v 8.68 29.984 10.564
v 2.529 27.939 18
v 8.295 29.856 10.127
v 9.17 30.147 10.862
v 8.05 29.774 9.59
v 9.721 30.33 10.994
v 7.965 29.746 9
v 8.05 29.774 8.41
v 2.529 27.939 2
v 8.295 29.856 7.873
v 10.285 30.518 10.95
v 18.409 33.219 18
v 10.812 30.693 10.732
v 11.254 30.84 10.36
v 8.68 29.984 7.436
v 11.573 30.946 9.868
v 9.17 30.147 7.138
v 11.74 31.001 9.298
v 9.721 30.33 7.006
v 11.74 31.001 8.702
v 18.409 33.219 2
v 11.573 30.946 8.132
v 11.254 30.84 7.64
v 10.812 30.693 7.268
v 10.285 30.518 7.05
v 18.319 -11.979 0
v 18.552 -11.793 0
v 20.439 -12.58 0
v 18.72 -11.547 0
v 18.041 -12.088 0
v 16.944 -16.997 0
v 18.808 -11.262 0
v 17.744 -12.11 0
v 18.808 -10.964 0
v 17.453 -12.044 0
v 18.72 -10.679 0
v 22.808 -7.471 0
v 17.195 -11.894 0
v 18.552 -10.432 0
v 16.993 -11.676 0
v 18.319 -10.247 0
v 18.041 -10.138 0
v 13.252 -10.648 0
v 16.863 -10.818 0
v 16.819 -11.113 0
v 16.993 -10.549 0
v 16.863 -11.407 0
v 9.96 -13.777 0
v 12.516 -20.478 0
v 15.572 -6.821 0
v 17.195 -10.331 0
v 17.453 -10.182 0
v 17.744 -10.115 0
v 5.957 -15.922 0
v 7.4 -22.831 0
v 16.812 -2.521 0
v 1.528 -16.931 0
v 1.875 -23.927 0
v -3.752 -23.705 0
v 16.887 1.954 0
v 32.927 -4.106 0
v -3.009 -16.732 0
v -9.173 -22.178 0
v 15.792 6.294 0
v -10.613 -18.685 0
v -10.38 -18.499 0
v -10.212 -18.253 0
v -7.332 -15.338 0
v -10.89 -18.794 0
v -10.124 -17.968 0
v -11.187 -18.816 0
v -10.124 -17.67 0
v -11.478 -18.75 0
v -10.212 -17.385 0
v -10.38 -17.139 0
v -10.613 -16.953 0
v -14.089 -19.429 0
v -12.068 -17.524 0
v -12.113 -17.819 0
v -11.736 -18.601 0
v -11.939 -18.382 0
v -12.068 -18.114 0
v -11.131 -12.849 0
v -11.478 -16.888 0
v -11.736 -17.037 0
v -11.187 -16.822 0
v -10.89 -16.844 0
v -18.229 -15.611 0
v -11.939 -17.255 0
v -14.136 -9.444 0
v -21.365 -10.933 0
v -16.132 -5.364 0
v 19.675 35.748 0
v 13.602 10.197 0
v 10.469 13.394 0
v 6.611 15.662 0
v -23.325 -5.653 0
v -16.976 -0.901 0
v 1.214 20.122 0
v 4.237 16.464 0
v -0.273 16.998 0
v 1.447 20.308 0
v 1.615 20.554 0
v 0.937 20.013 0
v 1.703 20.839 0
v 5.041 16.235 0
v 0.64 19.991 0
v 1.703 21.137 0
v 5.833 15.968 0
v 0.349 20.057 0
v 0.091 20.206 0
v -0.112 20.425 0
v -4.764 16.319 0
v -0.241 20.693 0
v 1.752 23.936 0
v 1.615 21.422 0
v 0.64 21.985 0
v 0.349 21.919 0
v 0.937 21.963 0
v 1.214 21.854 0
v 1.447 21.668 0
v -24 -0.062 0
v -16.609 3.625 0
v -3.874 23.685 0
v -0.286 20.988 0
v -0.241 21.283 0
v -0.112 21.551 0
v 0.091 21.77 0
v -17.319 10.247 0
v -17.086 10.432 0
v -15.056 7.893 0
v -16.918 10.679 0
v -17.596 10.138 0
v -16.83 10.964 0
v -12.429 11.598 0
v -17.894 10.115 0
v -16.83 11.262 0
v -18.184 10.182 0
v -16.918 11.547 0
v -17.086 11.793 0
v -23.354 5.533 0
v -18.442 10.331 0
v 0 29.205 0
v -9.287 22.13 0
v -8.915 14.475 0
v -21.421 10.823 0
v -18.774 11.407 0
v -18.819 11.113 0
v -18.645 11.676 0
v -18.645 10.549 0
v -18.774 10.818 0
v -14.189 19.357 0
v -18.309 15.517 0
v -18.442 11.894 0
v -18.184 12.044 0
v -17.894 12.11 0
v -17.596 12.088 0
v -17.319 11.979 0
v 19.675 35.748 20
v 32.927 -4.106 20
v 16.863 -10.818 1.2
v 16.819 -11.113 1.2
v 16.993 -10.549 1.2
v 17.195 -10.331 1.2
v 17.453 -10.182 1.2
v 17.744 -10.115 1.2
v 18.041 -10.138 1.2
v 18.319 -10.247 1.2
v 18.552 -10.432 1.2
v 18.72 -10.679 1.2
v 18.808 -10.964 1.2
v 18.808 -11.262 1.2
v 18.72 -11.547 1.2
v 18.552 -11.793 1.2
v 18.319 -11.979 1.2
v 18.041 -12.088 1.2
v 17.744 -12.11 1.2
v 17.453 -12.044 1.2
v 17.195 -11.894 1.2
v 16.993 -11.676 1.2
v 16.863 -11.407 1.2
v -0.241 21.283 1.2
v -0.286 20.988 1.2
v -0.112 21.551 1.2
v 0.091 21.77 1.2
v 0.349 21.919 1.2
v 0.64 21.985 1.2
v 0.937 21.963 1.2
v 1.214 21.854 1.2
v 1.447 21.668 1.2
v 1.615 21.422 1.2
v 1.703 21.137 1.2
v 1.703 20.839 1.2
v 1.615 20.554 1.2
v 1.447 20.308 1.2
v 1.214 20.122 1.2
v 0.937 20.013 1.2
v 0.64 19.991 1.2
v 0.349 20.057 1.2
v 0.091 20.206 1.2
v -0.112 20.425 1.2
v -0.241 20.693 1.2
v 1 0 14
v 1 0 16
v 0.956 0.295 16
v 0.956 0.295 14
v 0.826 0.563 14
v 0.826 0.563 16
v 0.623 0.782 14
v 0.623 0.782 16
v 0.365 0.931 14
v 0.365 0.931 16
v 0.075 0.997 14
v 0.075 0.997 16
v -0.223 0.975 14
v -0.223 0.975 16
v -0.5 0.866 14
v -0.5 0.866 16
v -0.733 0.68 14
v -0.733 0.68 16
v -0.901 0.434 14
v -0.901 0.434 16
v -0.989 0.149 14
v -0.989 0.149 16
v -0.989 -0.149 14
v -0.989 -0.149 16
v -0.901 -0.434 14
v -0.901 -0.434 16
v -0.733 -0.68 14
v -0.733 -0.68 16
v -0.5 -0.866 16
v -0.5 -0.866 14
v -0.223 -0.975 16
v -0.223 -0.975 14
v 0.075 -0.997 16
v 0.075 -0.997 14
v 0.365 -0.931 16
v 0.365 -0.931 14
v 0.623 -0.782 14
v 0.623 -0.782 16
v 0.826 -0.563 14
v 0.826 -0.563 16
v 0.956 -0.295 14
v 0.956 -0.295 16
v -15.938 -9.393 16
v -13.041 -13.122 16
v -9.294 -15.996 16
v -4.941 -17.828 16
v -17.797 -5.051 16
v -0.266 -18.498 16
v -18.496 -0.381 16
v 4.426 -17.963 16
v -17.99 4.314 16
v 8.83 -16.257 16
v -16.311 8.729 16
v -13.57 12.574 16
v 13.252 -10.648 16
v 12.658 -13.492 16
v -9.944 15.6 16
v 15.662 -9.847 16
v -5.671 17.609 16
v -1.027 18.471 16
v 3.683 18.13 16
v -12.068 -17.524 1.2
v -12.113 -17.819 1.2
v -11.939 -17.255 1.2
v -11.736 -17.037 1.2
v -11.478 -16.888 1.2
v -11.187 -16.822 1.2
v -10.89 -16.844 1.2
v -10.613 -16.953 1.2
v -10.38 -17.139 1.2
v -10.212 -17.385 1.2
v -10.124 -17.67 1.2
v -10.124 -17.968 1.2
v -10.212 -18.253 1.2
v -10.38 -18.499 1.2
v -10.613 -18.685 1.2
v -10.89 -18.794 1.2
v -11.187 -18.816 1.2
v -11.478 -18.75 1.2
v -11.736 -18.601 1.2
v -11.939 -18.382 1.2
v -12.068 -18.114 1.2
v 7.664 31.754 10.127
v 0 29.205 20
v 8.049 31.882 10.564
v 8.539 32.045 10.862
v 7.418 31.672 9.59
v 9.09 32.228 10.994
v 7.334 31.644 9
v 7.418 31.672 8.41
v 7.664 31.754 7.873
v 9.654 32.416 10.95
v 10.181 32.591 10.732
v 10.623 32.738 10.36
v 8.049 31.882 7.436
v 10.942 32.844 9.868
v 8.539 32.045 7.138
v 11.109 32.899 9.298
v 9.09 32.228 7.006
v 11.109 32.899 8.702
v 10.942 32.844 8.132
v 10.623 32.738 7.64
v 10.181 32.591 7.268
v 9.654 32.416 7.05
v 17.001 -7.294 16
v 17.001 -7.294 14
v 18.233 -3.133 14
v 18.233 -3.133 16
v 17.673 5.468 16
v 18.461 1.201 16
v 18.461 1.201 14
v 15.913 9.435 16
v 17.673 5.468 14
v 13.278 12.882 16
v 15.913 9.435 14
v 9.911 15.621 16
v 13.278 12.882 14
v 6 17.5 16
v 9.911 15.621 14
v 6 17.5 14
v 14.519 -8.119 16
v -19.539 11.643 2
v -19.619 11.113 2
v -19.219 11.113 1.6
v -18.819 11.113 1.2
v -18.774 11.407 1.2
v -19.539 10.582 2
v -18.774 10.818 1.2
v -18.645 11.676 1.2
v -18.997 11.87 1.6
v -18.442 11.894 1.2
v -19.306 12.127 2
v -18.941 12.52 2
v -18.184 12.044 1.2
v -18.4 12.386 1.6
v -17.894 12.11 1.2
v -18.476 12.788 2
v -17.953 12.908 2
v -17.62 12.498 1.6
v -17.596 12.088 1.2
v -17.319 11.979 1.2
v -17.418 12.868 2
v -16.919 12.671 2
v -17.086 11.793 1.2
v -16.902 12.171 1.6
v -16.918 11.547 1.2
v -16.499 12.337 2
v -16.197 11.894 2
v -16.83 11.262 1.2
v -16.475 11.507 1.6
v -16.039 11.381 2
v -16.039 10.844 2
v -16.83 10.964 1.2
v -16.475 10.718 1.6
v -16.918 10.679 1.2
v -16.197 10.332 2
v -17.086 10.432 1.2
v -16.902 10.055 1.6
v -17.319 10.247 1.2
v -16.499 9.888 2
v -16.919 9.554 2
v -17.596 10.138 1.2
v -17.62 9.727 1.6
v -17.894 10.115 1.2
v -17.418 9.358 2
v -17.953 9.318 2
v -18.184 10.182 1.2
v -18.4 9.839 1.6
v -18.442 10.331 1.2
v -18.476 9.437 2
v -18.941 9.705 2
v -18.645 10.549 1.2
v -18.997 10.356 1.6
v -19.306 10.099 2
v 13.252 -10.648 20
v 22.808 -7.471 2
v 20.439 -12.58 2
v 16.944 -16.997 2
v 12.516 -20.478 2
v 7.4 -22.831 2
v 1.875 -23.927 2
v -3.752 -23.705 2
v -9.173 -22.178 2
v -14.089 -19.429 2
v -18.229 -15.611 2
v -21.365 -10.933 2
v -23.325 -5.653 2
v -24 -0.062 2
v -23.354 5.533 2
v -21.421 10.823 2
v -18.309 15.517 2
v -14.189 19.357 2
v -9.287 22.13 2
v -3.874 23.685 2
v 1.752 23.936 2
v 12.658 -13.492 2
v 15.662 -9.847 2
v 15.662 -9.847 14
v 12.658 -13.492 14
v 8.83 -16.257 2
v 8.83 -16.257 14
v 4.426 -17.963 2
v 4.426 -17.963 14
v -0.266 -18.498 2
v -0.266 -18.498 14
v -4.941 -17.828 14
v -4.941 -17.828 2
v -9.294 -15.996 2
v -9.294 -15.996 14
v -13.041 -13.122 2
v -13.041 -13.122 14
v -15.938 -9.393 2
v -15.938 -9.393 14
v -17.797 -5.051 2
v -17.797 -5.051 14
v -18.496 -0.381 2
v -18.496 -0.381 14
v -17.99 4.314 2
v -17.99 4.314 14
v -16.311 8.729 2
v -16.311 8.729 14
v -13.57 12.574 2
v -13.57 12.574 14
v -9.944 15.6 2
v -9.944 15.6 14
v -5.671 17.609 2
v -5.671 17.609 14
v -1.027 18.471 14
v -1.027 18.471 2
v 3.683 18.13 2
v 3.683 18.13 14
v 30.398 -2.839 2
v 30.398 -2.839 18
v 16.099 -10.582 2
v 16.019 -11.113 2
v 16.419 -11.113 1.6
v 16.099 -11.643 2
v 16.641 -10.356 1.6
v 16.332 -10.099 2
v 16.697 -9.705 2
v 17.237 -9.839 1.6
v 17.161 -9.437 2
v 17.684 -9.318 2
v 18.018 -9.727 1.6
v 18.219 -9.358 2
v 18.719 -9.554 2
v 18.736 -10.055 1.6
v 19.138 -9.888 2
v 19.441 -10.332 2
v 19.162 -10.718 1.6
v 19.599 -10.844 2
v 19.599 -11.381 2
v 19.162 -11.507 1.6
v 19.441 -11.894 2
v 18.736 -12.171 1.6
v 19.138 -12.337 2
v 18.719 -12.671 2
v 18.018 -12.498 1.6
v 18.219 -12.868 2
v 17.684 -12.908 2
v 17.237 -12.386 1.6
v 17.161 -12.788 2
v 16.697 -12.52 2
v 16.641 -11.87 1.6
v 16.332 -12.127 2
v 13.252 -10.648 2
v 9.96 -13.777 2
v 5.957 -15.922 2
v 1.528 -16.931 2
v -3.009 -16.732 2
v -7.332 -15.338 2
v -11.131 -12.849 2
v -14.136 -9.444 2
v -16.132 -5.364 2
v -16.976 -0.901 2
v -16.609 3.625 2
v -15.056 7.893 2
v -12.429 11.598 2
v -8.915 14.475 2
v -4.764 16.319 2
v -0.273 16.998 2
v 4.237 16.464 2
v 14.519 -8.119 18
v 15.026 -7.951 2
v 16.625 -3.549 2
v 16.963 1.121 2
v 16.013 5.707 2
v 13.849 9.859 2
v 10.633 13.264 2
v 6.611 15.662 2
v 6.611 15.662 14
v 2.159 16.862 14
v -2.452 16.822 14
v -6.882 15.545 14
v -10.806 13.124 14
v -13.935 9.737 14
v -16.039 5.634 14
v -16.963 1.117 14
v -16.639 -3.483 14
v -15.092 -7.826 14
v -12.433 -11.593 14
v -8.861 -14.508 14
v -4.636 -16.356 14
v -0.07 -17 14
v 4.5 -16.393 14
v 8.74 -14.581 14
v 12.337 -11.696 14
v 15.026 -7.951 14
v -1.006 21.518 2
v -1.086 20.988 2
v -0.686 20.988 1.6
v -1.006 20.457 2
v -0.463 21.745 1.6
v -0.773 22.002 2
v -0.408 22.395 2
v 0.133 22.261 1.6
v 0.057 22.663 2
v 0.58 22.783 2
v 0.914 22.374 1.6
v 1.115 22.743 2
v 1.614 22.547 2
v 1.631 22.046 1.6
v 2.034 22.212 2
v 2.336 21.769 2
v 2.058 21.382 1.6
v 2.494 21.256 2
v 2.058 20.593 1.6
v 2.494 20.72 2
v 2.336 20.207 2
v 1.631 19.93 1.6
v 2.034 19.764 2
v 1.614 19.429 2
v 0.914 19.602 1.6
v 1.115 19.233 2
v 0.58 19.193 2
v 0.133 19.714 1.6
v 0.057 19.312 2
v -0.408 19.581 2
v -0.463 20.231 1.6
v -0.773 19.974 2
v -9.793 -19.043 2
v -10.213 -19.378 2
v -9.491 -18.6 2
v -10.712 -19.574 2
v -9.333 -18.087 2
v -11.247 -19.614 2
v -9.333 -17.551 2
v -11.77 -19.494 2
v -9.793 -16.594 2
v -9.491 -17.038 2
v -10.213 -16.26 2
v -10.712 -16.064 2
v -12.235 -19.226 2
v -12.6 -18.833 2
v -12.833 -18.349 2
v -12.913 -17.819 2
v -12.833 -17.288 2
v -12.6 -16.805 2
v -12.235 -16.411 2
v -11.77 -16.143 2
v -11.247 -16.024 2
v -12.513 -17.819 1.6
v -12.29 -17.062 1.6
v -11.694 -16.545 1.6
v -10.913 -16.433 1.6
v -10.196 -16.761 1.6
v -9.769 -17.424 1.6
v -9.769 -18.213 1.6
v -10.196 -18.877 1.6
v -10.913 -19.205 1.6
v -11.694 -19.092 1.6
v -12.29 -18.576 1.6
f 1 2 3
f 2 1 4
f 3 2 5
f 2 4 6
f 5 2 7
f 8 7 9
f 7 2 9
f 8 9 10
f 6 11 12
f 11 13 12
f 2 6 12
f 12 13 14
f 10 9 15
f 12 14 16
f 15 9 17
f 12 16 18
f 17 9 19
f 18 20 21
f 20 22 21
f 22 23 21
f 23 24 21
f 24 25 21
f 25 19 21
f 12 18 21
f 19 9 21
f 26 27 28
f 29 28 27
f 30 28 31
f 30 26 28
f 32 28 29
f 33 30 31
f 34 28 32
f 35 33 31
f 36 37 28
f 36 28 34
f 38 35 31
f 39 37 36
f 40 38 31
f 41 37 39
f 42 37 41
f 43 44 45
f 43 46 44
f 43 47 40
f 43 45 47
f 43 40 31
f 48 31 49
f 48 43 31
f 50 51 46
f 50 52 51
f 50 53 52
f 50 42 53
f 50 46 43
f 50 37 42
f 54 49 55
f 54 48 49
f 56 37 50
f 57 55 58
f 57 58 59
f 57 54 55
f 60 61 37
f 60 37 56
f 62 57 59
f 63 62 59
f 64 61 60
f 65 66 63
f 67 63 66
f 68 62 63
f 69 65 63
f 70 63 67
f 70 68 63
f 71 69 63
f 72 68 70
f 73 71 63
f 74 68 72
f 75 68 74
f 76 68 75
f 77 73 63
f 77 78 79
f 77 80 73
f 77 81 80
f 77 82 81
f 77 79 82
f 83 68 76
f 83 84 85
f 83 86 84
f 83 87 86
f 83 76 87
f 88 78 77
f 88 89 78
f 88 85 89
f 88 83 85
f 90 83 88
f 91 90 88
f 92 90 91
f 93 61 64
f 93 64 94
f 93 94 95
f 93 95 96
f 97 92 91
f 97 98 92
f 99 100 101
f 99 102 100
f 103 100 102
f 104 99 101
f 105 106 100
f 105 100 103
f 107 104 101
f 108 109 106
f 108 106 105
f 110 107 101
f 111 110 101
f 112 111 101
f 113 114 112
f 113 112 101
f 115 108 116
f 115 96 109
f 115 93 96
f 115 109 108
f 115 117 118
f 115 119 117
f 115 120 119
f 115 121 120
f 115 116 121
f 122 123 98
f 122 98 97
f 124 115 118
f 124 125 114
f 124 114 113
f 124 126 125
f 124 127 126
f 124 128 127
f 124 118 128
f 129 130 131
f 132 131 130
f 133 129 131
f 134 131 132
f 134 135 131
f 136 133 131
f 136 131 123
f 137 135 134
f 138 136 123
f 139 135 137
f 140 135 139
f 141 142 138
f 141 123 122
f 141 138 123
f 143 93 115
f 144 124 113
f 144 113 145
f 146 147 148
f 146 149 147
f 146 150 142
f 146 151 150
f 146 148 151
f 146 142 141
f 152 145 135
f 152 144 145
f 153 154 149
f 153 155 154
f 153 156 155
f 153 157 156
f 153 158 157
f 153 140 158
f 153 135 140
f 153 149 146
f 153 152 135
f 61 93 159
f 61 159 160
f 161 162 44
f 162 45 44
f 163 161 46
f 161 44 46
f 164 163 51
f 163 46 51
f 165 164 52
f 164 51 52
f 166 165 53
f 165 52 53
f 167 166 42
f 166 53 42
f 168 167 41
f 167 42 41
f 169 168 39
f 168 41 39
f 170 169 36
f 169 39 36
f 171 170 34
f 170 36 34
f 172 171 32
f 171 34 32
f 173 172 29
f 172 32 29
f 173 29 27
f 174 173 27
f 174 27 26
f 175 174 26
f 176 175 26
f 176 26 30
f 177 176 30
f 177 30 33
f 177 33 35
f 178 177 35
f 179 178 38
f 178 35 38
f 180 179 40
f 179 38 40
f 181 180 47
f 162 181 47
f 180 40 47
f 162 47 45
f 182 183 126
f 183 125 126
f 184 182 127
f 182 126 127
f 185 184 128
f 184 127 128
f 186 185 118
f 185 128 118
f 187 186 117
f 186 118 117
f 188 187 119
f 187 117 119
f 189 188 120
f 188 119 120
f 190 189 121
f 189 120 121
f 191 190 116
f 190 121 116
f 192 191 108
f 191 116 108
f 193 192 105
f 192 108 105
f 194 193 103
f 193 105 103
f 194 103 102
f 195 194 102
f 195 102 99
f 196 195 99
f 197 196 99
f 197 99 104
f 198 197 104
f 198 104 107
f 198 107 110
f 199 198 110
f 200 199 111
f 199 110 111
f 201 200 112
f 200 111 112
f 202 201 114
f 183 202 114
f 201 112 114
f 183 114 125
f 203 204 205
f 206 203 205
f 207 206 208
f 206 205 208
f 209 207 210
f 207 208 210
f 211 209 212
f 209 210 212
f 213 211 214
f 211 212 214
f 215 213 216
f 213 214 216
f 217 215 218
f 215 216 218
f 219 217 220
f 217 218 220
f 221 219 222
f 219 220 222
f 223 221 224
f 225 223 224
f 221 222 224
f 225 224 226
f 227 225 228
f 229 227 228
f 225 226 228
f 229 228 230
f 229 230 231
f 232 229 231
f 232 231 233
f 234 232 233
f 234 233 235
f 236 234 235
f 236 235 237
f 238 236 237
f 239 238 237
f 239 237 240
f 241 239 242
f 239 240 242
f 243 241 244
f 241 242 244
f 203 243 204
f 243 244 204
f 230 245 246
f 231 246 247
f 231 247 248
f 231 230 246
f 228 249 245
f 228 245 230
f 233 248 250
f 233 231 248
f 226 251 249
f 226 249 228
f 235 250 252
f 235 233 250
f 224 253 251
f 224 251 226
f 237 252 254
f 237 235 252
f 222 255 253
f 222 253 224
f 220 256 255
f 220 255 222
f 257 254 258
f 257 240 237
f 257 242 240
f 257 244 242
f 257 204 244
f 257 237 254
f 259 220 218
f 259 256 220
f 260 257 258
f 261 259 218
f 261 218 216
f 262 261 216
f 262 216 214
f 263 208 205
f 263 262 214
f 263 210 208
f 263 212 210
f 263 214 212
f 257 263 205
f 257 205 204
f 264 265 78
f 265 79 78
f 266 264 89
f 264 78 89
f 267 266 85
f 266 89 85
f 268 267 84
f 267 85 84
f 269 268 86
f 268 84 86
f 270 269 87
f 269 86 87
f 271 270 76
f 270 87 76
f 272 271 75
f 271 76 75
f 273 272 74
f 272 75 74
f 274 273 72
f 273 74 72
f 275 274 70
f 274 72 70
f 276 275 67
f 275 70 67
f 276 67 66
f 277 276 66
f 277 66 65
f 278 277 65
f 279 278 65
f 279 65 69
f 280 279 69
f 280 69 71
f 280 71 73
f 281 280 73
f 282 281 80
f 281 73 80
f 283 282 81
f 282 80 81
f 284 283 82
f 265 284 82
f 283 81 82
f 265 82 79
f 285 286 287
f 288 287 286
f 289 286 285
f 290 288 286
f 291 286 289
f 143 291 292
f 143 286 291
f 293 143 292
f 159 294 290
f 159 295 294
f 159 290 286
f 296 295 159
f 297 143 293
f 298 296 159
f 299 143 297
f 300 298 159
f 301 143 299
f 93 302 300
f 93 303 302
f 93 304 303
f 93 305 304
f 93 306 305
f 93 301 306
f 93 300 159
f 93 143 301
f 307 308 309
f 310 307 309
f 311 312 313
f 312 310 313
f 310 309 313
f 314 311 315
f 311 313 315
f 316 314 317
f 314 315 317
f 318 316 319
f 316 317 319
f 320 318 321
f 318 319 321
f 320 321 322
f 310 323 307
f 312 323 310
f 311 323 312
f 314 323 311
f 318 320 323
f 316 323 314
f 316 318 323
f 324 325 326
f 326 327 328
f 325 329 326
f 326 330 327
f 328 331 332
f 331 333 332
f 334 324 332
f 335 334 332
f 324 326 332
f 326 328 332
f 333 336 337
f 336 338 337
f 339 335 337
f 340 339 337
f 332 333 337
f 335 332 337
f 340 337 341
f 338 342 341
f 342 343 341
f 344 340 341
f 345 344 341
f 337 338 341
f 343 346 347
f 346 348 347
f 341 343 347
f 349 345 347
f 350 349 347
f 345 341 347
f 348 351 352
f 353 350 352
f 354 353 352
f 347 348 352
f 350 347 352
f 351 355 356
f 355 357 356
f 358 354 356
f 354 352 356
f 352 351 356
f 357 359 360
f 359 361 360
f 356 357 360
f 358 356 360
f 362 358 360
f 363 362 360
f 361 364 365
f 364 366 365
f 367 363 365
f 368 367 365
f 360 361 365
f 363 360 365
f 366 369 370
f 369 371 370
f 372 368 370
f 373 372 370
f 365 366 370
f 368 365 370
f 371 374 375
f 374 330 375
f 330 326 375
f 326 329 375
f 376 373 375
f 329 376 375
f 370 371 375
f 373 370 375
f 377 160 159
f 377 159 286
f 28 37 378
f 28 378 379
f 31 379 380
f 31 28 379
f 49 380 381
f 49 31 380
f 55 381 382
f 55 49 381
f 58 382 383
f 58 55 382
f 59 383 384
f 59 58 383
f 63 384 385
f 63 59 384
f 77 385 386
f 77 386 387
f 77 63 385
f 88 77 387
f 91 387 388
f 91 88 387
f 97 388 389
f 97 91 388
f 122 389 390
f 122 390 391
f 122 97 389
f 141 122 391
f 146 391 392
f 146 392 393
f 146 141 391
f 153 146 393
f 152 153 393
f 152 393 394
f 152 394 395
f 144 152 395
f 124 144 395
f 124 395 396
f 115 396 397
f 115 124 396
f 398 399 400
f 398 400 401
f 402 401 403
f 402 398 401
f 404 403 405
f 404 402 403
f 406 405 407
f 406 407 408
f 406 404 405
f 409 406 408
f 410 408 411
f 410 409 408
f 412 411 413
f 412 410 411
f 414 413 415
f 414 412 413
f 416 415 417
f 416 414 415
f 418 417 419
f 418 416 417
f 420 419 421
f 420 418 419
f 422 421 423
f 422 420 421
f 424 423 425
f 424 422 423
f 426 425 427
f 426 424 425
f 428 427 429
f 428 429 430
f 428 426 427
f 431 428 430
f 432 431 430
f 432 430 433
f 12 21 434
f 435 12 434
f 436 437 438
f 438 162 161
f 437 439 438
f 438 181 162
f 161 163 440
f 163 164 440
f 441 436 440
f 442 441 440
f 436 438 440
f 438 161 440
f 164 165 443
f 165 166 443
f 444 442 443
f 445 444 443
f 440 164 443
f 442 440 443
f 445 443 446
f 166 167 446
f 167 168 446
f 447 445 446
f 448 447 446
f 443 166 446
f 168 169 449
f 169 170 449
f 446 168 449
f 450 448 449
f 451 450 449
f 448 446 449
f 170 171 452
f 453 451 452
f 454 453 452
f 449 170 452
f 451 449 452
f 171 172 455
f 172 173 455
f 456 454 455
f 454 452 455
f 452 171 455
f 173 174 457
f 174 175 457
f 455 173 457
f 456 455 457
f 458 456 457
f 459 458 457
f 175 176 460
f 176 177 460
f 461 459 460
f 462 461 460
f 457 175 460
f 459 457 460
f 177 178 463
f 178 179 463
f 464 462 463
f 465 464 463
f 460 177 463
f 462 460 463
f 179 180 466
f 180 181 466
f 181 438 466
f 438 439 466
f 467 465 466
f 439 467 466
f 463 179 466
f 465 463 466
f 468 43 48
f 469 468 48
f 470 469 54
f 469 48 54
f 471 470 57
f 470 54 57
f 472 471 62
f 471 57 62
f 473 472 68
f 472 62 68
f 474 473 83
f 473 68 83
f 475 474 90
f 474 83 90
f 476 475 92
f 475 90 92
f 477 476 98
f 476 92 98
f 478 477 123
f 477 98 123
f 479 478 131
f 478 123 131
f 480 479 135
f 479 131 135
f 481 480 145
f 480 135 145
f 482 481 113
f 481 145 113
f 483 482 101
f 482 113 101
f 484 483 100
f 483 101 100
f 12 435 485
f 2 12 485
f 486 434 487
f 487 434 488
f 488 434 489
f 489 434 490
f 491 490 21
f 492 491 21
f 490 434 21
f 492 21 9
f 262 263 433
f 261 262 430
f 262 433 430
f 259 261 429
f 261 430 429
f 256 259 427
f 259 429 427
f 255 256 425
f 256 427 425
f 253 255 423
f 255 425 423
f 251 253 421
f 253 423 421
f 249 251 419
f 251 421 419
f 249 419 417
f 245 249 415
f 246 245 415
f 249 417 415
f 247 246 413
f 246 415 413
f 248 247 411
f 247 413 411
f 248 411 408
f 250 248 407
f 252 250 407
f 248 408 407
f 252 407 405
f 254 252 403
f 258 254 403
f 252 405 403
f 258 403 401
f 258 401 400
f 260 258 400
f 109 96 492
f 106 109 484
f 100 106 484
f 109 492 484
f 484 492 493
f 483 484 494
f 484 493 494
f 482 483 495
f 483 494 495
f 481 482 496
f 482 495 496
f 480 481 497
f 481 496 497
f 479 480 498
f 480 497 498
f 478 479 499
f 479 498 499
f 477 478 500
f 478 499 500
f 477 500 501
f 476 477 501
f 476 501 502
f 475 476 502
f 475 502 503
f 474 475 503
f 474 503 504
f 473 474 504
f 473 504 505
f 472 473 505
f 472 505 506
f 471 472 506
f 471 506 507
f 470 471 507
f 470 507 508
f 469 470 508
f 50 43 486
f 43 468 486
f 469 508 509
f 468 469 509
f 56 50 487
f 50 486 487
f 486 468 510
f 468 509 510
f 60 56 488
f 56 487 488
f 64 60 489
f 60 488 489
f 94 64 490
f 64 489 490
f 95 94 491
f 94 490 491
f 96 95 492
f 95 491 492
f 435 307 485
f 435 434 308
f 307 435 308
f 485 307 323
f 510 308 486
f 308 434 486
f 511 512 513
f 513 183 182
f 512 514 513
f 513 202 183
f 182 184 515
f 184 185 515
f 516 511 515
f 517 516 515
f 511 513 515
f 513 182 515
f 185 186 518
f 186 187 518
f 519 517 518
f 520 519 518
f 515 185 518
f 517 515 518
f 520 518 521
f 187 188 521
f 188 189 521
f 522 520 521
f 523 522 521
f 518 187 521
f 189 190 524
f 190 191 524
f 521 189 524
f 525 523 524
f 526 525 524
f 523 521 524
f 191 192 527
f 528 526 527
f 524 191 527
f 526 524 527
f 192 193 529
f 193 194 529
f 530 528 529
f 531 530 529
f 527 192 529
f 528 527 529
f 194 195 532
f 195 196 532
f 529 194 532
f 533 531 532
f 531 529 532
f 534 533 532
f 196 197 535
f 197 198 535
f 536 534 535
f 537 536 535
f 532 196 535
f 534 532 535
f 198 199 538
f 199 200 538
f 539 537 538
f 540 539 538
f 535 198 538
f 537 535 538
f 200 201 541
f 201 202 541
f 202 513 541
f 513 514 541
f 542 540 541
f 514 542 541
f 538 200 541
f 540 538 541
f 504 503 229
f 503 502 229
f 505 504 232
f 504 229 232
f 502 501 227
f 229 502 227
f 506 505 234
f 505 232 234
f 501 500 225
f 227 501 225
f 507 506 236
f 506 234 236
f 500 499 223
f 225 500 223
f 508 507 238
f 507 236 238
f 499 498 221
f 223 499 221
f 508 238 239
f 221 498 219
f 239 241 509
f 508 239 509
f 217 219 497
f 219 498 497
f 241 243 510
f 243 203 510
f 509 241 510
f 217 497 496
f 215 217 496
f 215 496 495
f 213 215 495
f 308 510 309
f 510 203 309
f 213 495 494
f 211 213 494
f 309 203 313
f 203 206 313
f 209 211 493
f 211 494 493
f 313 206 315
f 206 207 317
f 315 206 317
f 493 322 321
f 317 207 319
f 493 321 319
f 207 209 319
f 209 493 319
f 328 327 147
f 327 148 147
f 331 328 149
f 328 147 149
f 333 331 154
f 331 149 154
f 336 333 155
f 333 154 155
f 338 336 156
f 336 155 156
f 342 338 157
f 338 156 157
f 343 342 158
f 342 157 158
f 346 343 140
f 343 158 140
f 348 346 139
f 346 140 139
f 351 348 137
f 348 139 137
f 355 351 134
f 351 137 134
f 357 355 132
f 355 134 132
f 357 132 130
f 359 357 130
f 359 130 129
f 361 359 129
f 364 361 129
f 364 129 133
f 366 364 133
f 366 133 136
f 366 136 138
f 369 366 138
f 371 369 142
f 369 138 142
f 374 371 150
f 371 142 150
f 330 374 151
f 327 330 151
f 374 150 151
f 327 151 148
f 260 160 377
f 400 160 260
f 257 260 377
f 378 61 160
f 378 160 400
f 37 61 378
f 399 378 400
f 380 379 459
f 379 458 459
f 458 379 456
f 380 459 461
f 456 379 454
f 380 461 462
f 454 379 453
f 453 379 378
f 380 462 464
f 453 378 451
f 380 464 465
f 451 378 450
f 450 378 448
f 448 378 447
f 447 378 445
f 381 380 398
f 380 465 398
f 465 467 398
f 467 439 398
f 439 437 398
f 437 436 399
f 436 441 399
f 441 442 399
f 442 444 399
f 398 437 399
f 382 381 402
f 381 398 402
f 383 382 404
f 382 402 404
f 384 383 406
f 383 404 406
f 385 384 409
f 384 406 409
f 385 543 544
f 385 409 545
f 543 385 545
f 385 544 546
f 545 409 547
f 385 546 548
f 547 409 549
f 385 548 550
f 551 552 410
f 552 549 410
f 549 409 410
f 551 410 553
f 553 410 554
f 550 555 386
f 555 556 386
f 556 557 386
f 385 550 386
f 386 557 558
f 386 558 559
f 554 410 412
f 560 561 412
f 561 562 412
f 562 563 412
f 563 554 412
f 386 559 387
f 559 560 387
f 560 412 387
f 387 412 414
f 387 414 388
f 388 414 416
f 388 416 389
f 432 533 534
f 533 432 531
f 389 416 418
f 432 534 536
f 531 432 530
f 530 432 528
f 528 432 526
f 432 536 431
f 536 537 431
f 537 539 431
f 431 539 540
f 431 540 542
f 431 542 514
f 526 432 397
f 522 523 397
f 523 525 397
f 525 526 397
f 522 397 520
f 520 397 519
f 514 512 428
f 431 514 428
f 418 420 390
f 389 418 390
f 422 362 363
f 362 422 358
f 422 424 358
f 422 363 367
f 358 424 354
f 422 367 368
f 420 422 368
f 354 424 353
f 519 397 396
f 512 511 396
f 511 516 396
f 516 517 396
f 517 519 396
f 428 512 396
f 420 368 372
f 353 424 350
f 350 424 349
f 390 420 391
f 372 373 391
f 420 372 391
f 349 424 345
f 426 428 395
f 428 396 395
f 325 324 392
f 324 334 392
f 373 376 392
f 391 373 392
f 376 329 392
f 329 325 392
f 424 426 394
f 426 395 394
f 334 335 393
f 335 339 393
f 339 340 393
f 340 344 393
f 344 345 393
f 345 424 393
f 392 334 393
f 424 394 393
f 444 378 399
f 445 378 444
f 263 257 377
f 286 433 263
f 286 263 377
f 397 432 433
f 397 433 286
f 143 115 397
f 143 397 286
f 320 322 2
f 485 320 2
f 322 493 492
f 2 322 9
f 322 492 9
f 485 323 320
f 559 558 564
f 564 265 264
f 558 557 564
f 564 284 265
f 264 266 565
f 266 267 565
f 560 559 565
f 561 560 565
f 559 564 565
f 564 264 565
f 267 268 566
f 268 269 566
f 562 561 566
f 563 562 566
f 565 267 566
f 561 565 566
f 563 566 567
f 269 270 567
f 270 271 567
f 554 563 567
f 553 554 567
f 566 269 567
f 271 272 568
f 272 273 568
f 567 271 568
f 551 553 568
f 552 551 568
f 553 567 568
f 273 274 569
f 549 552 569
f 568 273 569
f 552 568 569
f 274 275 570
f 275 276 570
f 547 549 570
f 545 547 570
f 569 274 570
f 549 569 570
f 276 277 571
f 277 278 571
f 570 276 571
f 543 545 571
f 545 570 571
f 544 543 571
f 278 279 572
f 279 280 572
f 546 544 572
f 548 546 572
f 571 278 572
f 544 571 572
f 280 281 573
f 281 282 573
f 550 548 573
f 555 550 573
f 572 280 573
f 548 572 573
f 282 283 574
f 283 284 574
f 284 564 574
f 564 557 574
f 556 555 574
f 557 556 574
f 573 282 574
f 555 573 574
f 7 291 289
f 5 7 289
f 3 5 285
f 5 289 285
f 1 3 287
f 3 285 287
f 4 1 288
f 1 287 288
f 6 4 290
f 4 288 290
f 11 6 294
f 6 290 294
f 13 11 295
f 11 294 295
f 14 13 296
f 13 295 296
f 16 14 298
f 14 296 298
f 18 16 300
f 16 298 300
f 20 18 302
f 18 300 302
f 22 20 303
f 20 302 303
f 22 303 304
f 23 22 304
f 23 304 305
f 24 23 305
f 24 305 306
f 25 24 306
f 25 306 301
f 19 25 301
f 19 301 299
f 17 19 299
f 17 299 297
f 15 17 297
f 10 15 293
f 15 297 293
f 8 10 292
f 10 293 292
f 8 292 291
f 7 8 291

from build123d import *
from build123d.topology import SkipClean

# Parameters (mm, degrees)
ESTRUSIONE_ESTRUSIONE1_DEPTH             = 2
ESTRUSIONE_ESTRUSIONE3_DEPTH             = 12
ESTRUSIONE_ESTRUSIONE4_DEPTH             = 12
SCHIZZO7_R                               = 17
TAGLIO_ESTRUSIONE1_DEPTH                 = 12
ESTRUSIONE_ESTRUSIONE5_DEPTH             = 4
ESTRUSIONE_ESTRUSIONE6_DEPTH             = 2
SCHIZZO12_R                              = 18.5
ESTRUSIONE_ESTRUSIONE7_DEPTH             = 2
SCHIZZO13_R                              = 1
TAGLIO_ESTRUSIONE2_DEPTH                 = 2
SCHIZZO14_R                              = 1.9999999999999996
TAGLIO_ESTRUSIONE3_DEPTH                 = 2
FORO_SVASATO_PER_VITE_M1_6_1_D           = 2
FORO_SVASATO_PER_VITE_M1_6_1_CSINK_D     = 3.6
FORO_SVASATO_PER_VITE_M1_6_1_CSINK_ANGLE = 90


with BuildPart() as part:
    # Schizzo1 → Estrusione-Estrusione1 (new body)
    with BuildSketch(Plane.XY):
        with BuildLine():
            Line((1.7521545270351044, 23.935955266364257), (0, 29.20537764983825))
            Line((0, 29.20537764983825), (19.6753238609994, 35.74769012075539))
            Line((19.6753238609994, 35.74769012075539), (32.92722566640575, -4.1060253589917055))
            Line((32.92722566640575, -4.1060253589917055), (22.80756216564372, -7.470950947523162))
            ThreePointArc((22.80756216564372, -7.470950947523162), (-19.934727499721227, -13.364379503435943), (1.7521545270351044, 23.935955266364257))
        make_face()
        with BuildLine():
            Line((4.2368221069293845, 16.46357611317282), (13.251901805406366, -10.648337829908835))
            ThreePointArc((13.251901805406366, -10.648337829908835), (-16.131578826473948, -5.3639691055465315), (4.2368221069293845, 16.46357611317282))
        make_face(mode=Mode.SUBTRACT)
    extrude(amount=ESTRUSIONE_ESTRUSIONE1_DEPTH)

    # Schizzo3 → Estrusione-Estrusione3 (add)
    with SkipClean():  # the faces are left unmerged after this step: merging them gives an invalid solid
        with BuildSketch(Plane.XY.offset(2)):
            with BuildLine():
                Line((13.25190180540636, -10.64833782990884), (15.661571428601047, -9.84708994509684))
                ThreePointArc((15.661571428601047, -9.84708994509684), (-17.00666852177596, -7.281704868396873), (3.6828047807986604, 18.12972556180944))
                Line((3.6828047807986604, 18.12972556180944), (4.236822106929399, 16.463576113172813))
                ThreePointArc((4.236822106929399, 16.463576113172813), (-16.131578826473945, -5.363969105546531), (13.25190180540636, -10.64833782990884))
            make_face()
        extrude(amount=ESTRUSIONE_ESTRUSIONE3_DEPTH)

    # Schizzo5 → Estrusione-Estrusione4 (add)
    with SkipClean():  # the faces are left unmerged after this step: merging them gives an invalid solid
        with BuildSketch(Plane.XY.offset(2)):
            Polygon((4.2368221069293845, 16.46357611317282), (9.20072700457541, 7.873738581138368), (2.5288879920024105, 27.938600035611493), (18.408546246772644, 33.21880212875297), (30.39833767440335, -2.8392477447649496), (12.62084661651854, -8.75050502679426), (13.251901805406368, -10.648337829908835), (32.92722566640575, -4.1060253589917055), (19.6753238609994, 35.74769012075539), (0, 29.20537764983825), align=None)
        extrude(amount=ESTRUSIONE_ESTRUSIONE4_DEPTH)

    # Schizzo7 → Taglio-Estrusione1 (cut, symmetric)
    with SkipClean():  # the faces are left unmerged after this step: merging them gives an invalid solid
        with BuildSketch(Plane.XY.offset(2)):
            with Locations(Location((0, 0, 0), (0, 0, 67.114761627))):
                Circle(SCHIZZO7_R)
        extrude(amount=TAGLIO_ESTRUSIONE1_DEPTH, both=True, mode=Mode.SUBTRACT)

    # Schizzo10 → Estrusione-Estrusione5 (add)
    with SkipClean():  # the faces are left unmerged after this step: merging them gives an invalid solid
        with BuildSketch(Plane.XY.offset(14)):
            Polygon((32.92722566640575, -4.1060253589917055), (13.251901805406353, -10.648337829908842), (0, 29.20537764983825), (19.6753238609994, 35.74769012075539), align=None)
            Polygon((30.39833767440335, -2.8392477447649496), (14.51867941963312, -8.119449837906433), (2.5288879920024105, 27.938600035611493), (18.408546246772644, 33.21880212875297), align=None, mode=Mode.SUBTRACT)
        extrude(amount=ESTRUSIONE_ESTRUSIONE5_DEPTH)

    # Schizzo11 → Estrusione-Estrusione6 (add)
    with SkipClean():  # the faces are left unmerged after this step: merging them gives an invalid solid
        with BuildSketch(Plane.XY.offset(18.000000000000004)):
            Polygon((32.92722566640575, -4.1060253589917055), (13.25190180540637, -10.648337829908844), (0, 29.20537764983825), (19.6753238609994, 35.74769012075539), align=None)
        extrude(amount=ESTRUSIONE_ESTRUSIONE6_DEPTH)

    # Schizzo12 → Estrusione-Estrusione7 (add)
    with SkipClean():  # the faces are left unmerged after this step: merging them gives an invalid solid
        with BuildSketch(Plane.XY.offset(14)):
            Circle(SCHIZZO12_R)
        extrude(amount=ESTRUSIONE_ESTRUSIONE7_DEPTH)

    # Schizzo13 → Taglio-Estrusione2 (cut)
    with SkipClean():  # the faces are left unmerged after this step: merging them gives an invalid solid
        with BuildSketch(Plane.XY.offset(16)):
            Circle(SCHIZZO13_R)
        extrude(amount=-TAGLIO_ESTRUSIONE2_DEPTH, mode=Mode.SUBTRACT)

    # Schizzo14 → Taglio-Estrusione3 (cut)
    with SkipClean():  # the faces are left unmerged after this step: merging them gives an invalid solid
        with BuildSketch(Plane(origin=(-8.744361956167872, 26.29775850820628, 0), x_dir=(0.9489164015572907, 0.31552759444391354, 0), z_dir=(-0.31552759444391354, 0.9489164015572907, 0))):
            with Locations(Location((18.94410254301622, -9.000000000000004, 0), (0, 0, 180))):
                Circle(SCHIZZO14_R)
        extrude(amount=-TAGLIO_ESTRUSIONE3_DEPTH, mode=Mode.SUBTRACT)

    # Foro svasato per Vite M1.6-1 (through all)
    with Locations(Plane(origin=(0.714435954, 20.987843655, 2), x_dir=(1, 0, 0), z_dir=(0, 0, 1))):
        with Locations((0, 0), (-18.533223752, -9.875202142), (-11.827077467, -38.806631453), (17.104351844, -32.100485168)):
            CounterSinkHole(FORO_SVASATO_PER_VITE_M1_6_1_D / 2, FORO_SVASATO_PER_VITE_M1_6_1_CSINK_D / 2, counter_sink_angle=FORO_SVASATO_PER_VITE_M1_6_1_CSINK_ANGLE)


solid = part.part
